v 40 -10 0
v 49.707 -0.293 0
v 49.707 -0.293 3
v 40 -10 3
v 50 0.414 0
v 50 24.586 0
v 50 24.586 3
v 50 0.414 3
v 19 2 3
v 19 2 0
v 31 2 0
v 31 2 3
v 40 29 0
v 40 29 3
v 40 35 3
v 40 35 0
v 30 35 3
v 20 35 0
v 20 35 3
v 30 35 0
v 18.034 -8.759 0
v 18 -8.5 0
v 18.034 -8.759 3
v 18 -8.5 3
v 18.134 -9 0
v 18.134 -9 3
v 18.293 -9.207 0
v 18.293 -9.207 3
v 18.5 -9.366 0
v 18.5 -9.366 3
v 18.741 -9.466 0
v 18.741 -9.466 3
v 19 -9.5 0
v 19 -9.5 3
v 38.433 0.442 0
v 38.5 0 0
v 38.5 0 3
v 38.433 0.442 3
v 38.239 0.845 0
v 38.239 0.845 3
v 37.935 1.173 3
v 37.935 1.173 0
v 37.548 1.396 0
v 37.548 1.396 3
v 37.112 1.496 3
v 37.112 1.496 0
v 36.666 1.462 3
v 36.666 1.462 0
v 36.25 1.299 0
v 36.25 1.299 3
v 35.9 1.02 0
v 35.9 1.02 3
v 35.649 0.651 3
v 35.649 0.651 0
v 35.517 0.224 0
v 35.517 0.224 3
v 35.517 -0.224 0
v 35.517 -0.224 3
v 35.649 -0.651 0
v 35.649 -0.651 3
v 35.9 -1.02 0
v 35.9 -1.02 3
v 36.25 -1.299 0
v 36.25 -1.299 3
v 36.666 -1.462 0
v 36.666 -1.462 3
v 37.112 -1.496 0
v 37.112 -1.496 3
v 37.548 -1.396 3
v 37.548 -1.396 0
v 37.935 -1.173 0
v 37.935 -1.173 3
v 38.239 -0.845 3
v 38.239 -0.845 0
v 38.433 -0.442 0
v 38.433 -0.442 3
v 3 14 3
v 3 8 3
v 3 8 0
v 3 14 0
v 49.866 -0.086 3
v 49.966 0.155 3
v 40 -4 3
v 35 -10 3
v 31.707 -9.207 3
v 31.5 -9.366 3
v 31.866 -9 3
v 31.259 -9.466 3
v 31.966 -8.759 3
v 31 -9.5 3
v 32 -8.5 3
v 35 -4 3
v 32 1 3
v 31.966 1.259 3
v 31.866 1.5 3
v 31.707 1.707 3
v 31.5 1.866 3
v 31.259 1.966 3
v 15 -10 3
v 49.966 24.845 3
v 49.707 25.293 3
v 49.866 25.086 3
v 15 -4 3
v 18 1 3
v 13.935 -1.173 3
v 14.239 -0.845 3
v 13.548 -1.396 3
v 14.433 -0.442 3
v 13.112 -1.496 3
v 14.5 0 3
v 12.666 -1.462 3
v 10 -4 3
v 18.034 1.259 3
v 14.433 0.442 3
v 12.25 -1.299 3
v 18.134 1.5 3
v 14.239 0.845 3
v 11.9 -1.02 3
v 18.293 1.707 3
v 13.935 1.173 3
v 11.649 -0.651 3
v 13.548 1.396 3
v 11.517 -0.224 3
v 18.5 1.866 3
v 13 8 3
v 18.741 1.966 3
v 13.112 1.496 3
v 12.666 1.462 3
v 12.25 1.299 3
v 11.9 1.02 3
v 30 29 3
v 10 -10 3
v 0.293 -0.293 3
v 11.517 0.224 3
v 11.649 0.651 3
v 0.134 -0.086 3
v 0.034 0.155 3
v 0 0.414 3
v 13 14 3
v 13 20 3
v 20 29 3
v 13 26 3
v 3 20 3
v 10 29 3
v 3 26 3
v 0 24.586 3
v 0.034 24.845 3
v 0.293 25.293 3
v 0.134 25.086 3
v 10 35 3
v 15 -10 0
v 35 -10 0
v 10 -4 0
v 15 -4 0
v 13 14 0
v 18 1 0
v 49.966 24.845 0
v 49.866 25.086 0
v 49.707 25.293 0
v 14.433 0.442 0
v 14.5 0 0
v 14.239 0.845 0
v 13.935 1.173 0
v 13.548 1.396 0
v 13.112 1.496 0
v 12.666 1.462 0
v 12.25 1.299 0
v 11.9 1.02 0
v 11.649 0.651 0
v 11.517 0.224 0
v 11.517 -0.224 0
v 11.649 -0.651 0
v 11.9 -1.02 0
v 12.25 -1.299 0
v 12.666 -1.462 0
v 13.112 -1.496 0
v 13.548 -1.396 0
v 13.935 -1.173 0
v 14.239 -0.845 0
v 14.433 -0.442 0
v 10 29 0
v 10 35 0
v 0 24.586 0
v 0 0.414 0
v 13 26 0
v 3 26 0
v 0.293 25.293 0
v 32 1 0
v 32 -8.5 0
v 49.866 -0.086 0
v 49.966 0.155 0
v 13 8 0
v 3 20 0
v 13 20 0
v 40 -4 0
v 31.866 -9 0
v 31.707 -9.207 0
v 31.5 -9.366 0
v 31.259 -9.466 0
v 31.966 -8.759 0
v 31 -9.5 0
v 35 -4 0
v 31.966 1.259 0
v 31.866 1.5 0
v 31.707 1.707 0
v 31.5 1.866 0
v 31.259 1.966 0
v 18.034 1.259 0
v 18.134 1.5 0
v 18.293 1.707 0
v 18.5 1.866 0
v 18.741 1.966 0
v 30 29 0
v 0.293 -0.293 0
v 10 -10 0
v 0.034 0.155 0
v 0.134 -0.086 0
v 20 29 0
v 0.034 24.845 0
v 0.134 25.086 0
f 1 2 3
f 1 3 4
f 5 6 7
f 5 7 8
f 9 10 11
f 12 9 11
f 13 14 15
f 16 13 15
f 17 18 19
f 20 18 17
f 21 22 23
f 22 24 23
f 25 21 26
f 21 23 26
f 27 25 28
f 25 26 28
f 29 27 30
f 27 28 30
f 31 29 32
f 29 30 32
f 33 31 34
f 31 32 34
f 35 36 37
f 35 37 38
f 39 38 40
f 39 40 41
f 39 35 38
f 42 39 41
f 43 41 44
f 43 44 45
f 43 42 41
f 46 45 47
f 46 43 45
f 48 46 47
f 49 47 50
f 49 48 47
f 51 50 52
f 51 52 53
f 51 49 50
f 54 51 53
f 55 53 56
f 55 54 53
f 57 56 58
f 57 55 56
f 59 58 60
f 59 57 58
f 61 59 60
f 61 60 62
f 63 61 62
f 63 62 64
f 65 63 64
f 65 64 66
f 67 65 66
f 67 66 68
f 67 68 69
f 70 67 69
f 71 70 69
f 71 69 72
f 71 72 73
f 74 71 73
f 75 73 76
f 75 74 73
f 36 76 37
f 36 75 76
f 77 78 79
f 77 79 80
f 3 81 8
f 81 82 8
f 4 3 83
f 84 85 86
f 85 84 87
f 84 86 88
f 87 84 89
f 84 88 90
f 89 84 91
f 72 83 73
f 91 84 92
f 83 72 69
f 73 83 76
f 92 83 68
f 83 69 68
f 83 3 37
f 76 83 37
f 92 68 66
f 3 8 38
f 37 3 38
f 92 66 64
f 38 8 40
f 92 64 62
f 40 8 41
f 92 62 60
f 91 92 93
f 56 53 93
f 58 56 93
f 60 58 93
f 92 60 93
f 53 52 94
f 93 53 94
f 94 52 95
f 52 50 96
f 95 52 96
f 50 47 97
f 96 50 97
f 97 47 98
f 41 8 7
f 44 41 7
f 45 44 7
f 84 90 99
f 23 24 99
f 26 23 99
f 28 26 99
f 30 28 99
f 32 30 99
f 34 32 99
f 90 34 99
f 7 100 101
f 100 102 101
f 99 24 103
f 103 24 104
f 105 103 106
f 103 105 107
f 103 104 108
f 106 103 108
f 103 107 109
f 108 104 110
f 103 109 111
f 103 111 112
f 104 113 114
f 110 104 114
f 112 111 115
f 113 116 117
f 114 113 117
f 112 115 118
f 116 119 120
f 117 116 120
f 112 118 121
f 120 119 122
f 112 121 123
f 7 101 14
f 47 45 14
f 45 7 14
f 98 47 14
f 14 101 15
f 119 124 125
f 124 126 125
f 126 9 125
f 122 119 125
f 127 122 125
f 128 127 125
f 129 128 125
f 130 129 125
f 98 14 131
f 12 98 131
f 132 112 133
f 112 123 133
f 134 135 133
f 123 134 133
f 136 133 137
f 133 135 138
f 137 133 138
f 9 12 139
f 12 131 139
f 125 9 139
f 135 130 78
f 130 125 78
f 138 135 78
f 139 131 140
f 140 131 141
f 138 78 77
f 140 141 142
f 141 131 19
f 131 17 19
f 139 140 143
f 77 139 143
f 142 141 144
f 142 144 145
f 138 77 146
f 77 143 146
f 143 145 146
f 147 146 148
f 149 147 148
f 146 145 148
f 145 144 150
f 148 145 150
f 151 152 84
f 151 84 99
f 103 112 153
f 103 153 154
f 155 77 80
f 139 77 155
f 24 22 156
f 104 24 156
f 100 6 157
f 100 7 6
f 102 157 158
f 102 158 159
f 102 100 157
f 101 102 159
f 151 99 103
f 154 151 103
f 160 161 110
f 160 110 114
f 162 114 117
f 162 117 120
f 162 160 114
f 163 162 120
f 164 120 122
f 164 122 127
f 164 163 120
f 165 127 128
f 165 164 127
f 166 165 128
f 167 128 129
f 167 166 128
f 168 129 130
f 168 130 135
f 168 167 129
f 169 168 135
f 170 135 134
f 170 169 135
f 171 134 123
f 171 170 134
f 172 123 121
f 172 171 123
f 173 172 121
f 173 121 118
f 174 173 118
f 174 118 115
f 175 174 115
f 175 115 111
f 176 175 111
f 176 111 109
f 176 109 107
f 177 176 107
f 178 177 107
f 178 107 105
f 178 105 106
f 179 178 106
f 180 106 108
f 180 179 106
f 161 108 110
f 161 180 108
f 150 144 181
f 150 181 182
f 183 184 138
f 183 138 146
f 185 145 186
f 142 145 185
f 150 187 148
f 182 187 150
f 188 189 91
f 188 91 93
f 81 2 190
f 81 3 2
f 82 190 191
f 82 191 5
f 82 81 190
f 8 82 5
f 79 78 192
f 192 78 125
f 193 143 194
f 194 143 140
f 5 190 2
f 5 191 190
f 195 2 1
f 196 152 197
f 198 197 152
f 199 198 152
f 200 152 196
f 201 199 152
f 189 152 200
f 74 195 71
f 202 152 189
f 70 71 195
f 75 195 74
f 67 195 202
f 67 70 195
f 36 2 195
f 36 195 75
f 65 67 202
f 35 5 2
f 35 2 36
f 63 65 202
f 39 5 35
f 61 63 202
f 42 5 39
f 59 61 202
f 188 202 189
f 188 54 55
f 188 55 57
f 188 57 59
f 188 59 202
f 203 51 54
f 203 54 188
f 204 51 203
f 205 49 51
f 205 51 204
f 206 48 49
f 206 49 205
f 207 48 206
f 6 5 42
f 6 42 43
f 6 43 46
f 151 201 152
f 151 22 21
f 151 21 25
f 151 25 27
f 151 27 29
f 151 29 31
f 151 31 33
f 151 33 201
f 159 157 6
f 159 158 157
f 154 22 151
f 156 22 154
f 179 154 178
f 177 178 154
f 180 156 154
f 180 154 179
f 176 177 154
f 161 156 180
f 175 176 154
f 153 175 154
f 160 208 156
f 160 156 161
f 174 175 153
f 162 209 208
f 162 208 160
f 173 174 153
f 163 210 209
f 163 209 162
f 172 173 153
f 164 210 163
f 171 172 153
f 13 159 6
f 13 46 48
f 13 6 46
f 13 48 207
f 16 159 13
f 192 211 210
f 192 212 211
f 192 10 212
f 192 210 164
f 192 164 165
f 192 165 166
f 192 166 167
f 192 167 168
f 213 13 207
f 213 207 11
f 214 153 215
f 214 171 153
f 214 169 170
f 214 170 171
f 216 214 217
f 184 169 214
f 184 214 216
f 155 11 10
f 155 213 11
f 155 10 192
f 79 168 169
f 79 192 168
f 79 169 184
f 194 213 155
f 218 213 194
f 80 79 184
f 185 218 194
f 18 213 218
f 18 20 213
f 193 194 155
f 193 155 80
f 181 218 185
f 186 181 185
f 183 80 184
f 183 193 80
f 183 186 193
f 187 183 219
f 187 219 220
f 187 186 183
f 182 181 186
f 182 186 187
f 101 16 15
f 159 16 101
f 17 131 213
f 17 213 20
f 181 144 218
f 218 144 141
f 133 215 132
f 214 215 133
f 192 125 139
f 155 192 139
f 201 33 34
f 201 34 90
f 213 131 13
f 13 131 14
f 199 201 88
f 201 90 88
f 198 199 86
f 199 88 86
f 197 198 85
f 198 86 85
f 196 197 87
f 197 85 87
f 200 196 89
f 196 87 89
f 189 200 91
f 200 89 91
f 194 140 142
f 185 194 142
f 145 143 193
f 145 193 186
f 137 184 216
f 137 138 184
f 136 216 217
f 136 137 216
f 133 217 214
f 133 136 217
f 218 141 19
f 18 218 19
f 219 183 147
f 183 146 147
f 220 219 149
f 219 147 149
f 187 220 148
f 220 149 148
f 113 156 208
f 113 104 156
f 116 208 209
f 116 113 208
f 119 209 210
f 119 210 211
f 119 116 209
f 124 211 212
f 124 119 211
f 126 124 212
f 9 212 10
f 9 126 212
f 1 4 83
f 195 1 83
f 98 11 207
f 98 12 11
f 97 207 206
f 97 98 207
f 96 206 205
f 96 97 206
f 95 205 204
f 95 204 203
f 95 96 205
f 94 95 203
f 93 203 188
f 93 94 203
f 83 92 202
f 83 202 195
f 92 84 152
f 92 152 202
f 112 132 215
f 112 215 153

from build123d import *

# Parameters (mm, degrees)
SKETCH1_R           = 1.5
SKETCH1_W           = 14
SKETCH1_H           = 11.5
BOSS_EXTRUDE1_DEPTH = 3
SKETCH2_W           = 10
SKETCH2_H           = 6
SKETCH2_W_2         = 5
CUT_EXTRUDE1_DEPTH  = 62.10646447
SKETCH3_W           = 10
SKETCH3_H           = 6
CUT_EXTRUDE2_DEPTH  = 62.10646447
FILLET1_R           = 1


with BuildPart() as part:
    # Sketch1 → Boss-Extrude1 (new body)
    with BuildSketch(Plane.XY):
        Polygon((0, 0), (0, 25), (10, 35), (40, 35), (50, 25), (50, 0), (40, -10), (10, -10), align=None)
        with Locations((13, 0)):
            Circle(SKETCH1_R, mode=Mode.SUBTRACT)
        with Locations((37, 0)):
            Circle(SKETCH1_R, mode=Mode.SUBTRACT)
        with Locations((25, -3.75)):
            Rectangle(SKETCH1_W, SKETCH1_H, mode=Mode.SUBTRACT)
    extrude(amount=BOSS_EXTRUDE1_DEPTH)

    # Sketch2 → Cut-Extrude1 (cut, through all)
    with BuildSketch(Plane.XY.offset(3)):
        with Locations((15, 32)):
            Rectangle(SKETCH2_W, SKETCH2_H)
        with Locations((35, 32)):
            Rectangle(SKETCH2_W, SKETCH2_H)
        with Locations((12.5, -7)):
            Rectangle(SKETCH2_W_2, SKETCH2_H)
        with Locations((37.5, -7)):
            Rectangle(SKETCH2_W_2, SKETCH2_H)
    extrude(amount=-CUT_EXTRUDE1_DEPTH, mode=Mode.SUBTRACT)

    # Sketch3 → Cut-Extrude2 (cut, through all)
    with BuildSketch(Plane.XY.offset(3)):
        with Locations((8, 11)):
            Rectangle(SKETCH3_W, SKETCH3_H)
        with Locations((8, 23)):
            Rectangle(SKETCH3_W, SKETCH3_H)
    extrude(amount=-CUT_EXTRUDE2_DEPTH, mode=Mode.SUBTRACT)

    # Fillet1
    fillet1_edges = [part.edges().sort_by_distance(p)[0] for p in [
        (0, 0, 1.5),
        (0, 25, 1.5),
        (50, 25, 1.5),
        (50, 0, 1.5),
        (18, 2, 1.5),
        (18, -9.5, 1.5),
        (32, -9.5, 1.5),
        (32, 2, 1.5),
    ]]
    fillet(fillet1_edges, radius=FILLET1_R)


solid = part.part
